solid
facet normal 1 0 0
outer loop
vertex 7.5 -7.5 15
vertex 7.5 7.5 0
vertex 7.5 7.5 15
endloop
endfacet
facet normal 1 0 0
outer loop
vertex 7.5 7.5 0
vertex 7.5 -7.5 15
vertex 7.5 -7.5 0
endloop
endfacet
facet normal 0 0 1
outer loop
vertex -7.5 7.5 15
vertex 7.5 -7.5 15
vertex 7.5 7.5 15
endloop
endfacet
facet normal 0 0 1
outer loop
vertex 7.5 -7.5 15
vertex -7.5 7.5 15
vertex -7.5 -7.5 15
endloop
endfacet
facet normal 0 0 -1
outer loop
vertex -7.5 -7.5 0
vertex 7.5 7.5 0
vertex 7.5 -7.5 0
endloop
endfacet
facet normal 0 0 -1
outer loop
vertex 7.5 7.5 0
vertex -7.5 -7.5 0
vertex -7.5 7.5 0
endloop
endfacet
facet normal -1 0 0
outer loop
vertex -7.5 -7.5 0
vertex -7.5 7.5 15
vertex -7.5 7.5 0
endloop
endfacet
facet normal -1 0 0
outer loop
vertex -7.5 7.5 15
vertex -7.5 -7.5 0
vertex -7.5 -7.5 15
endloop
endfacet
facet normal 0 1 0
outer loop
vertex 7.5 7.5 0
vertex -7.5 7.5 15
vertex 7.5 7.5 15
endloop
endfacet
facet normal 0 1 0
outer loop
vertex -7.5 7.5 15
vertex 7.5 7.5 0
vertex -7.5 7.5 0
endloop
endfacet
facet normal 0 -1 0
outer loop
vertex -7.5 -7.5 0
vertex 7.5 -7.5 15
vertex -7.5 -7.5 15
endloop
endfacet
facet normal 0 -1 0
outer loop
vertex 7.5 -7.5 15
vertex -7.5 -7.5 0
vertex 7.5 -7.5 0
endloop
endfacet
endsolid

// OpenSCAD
$fn = 50;


difference() {
	union() {
		translate(v = [-7.5000000000, -7.5000000000, 0]) {
			cube(size = [15, 15, 15]);
		}
	}
	union();
}
